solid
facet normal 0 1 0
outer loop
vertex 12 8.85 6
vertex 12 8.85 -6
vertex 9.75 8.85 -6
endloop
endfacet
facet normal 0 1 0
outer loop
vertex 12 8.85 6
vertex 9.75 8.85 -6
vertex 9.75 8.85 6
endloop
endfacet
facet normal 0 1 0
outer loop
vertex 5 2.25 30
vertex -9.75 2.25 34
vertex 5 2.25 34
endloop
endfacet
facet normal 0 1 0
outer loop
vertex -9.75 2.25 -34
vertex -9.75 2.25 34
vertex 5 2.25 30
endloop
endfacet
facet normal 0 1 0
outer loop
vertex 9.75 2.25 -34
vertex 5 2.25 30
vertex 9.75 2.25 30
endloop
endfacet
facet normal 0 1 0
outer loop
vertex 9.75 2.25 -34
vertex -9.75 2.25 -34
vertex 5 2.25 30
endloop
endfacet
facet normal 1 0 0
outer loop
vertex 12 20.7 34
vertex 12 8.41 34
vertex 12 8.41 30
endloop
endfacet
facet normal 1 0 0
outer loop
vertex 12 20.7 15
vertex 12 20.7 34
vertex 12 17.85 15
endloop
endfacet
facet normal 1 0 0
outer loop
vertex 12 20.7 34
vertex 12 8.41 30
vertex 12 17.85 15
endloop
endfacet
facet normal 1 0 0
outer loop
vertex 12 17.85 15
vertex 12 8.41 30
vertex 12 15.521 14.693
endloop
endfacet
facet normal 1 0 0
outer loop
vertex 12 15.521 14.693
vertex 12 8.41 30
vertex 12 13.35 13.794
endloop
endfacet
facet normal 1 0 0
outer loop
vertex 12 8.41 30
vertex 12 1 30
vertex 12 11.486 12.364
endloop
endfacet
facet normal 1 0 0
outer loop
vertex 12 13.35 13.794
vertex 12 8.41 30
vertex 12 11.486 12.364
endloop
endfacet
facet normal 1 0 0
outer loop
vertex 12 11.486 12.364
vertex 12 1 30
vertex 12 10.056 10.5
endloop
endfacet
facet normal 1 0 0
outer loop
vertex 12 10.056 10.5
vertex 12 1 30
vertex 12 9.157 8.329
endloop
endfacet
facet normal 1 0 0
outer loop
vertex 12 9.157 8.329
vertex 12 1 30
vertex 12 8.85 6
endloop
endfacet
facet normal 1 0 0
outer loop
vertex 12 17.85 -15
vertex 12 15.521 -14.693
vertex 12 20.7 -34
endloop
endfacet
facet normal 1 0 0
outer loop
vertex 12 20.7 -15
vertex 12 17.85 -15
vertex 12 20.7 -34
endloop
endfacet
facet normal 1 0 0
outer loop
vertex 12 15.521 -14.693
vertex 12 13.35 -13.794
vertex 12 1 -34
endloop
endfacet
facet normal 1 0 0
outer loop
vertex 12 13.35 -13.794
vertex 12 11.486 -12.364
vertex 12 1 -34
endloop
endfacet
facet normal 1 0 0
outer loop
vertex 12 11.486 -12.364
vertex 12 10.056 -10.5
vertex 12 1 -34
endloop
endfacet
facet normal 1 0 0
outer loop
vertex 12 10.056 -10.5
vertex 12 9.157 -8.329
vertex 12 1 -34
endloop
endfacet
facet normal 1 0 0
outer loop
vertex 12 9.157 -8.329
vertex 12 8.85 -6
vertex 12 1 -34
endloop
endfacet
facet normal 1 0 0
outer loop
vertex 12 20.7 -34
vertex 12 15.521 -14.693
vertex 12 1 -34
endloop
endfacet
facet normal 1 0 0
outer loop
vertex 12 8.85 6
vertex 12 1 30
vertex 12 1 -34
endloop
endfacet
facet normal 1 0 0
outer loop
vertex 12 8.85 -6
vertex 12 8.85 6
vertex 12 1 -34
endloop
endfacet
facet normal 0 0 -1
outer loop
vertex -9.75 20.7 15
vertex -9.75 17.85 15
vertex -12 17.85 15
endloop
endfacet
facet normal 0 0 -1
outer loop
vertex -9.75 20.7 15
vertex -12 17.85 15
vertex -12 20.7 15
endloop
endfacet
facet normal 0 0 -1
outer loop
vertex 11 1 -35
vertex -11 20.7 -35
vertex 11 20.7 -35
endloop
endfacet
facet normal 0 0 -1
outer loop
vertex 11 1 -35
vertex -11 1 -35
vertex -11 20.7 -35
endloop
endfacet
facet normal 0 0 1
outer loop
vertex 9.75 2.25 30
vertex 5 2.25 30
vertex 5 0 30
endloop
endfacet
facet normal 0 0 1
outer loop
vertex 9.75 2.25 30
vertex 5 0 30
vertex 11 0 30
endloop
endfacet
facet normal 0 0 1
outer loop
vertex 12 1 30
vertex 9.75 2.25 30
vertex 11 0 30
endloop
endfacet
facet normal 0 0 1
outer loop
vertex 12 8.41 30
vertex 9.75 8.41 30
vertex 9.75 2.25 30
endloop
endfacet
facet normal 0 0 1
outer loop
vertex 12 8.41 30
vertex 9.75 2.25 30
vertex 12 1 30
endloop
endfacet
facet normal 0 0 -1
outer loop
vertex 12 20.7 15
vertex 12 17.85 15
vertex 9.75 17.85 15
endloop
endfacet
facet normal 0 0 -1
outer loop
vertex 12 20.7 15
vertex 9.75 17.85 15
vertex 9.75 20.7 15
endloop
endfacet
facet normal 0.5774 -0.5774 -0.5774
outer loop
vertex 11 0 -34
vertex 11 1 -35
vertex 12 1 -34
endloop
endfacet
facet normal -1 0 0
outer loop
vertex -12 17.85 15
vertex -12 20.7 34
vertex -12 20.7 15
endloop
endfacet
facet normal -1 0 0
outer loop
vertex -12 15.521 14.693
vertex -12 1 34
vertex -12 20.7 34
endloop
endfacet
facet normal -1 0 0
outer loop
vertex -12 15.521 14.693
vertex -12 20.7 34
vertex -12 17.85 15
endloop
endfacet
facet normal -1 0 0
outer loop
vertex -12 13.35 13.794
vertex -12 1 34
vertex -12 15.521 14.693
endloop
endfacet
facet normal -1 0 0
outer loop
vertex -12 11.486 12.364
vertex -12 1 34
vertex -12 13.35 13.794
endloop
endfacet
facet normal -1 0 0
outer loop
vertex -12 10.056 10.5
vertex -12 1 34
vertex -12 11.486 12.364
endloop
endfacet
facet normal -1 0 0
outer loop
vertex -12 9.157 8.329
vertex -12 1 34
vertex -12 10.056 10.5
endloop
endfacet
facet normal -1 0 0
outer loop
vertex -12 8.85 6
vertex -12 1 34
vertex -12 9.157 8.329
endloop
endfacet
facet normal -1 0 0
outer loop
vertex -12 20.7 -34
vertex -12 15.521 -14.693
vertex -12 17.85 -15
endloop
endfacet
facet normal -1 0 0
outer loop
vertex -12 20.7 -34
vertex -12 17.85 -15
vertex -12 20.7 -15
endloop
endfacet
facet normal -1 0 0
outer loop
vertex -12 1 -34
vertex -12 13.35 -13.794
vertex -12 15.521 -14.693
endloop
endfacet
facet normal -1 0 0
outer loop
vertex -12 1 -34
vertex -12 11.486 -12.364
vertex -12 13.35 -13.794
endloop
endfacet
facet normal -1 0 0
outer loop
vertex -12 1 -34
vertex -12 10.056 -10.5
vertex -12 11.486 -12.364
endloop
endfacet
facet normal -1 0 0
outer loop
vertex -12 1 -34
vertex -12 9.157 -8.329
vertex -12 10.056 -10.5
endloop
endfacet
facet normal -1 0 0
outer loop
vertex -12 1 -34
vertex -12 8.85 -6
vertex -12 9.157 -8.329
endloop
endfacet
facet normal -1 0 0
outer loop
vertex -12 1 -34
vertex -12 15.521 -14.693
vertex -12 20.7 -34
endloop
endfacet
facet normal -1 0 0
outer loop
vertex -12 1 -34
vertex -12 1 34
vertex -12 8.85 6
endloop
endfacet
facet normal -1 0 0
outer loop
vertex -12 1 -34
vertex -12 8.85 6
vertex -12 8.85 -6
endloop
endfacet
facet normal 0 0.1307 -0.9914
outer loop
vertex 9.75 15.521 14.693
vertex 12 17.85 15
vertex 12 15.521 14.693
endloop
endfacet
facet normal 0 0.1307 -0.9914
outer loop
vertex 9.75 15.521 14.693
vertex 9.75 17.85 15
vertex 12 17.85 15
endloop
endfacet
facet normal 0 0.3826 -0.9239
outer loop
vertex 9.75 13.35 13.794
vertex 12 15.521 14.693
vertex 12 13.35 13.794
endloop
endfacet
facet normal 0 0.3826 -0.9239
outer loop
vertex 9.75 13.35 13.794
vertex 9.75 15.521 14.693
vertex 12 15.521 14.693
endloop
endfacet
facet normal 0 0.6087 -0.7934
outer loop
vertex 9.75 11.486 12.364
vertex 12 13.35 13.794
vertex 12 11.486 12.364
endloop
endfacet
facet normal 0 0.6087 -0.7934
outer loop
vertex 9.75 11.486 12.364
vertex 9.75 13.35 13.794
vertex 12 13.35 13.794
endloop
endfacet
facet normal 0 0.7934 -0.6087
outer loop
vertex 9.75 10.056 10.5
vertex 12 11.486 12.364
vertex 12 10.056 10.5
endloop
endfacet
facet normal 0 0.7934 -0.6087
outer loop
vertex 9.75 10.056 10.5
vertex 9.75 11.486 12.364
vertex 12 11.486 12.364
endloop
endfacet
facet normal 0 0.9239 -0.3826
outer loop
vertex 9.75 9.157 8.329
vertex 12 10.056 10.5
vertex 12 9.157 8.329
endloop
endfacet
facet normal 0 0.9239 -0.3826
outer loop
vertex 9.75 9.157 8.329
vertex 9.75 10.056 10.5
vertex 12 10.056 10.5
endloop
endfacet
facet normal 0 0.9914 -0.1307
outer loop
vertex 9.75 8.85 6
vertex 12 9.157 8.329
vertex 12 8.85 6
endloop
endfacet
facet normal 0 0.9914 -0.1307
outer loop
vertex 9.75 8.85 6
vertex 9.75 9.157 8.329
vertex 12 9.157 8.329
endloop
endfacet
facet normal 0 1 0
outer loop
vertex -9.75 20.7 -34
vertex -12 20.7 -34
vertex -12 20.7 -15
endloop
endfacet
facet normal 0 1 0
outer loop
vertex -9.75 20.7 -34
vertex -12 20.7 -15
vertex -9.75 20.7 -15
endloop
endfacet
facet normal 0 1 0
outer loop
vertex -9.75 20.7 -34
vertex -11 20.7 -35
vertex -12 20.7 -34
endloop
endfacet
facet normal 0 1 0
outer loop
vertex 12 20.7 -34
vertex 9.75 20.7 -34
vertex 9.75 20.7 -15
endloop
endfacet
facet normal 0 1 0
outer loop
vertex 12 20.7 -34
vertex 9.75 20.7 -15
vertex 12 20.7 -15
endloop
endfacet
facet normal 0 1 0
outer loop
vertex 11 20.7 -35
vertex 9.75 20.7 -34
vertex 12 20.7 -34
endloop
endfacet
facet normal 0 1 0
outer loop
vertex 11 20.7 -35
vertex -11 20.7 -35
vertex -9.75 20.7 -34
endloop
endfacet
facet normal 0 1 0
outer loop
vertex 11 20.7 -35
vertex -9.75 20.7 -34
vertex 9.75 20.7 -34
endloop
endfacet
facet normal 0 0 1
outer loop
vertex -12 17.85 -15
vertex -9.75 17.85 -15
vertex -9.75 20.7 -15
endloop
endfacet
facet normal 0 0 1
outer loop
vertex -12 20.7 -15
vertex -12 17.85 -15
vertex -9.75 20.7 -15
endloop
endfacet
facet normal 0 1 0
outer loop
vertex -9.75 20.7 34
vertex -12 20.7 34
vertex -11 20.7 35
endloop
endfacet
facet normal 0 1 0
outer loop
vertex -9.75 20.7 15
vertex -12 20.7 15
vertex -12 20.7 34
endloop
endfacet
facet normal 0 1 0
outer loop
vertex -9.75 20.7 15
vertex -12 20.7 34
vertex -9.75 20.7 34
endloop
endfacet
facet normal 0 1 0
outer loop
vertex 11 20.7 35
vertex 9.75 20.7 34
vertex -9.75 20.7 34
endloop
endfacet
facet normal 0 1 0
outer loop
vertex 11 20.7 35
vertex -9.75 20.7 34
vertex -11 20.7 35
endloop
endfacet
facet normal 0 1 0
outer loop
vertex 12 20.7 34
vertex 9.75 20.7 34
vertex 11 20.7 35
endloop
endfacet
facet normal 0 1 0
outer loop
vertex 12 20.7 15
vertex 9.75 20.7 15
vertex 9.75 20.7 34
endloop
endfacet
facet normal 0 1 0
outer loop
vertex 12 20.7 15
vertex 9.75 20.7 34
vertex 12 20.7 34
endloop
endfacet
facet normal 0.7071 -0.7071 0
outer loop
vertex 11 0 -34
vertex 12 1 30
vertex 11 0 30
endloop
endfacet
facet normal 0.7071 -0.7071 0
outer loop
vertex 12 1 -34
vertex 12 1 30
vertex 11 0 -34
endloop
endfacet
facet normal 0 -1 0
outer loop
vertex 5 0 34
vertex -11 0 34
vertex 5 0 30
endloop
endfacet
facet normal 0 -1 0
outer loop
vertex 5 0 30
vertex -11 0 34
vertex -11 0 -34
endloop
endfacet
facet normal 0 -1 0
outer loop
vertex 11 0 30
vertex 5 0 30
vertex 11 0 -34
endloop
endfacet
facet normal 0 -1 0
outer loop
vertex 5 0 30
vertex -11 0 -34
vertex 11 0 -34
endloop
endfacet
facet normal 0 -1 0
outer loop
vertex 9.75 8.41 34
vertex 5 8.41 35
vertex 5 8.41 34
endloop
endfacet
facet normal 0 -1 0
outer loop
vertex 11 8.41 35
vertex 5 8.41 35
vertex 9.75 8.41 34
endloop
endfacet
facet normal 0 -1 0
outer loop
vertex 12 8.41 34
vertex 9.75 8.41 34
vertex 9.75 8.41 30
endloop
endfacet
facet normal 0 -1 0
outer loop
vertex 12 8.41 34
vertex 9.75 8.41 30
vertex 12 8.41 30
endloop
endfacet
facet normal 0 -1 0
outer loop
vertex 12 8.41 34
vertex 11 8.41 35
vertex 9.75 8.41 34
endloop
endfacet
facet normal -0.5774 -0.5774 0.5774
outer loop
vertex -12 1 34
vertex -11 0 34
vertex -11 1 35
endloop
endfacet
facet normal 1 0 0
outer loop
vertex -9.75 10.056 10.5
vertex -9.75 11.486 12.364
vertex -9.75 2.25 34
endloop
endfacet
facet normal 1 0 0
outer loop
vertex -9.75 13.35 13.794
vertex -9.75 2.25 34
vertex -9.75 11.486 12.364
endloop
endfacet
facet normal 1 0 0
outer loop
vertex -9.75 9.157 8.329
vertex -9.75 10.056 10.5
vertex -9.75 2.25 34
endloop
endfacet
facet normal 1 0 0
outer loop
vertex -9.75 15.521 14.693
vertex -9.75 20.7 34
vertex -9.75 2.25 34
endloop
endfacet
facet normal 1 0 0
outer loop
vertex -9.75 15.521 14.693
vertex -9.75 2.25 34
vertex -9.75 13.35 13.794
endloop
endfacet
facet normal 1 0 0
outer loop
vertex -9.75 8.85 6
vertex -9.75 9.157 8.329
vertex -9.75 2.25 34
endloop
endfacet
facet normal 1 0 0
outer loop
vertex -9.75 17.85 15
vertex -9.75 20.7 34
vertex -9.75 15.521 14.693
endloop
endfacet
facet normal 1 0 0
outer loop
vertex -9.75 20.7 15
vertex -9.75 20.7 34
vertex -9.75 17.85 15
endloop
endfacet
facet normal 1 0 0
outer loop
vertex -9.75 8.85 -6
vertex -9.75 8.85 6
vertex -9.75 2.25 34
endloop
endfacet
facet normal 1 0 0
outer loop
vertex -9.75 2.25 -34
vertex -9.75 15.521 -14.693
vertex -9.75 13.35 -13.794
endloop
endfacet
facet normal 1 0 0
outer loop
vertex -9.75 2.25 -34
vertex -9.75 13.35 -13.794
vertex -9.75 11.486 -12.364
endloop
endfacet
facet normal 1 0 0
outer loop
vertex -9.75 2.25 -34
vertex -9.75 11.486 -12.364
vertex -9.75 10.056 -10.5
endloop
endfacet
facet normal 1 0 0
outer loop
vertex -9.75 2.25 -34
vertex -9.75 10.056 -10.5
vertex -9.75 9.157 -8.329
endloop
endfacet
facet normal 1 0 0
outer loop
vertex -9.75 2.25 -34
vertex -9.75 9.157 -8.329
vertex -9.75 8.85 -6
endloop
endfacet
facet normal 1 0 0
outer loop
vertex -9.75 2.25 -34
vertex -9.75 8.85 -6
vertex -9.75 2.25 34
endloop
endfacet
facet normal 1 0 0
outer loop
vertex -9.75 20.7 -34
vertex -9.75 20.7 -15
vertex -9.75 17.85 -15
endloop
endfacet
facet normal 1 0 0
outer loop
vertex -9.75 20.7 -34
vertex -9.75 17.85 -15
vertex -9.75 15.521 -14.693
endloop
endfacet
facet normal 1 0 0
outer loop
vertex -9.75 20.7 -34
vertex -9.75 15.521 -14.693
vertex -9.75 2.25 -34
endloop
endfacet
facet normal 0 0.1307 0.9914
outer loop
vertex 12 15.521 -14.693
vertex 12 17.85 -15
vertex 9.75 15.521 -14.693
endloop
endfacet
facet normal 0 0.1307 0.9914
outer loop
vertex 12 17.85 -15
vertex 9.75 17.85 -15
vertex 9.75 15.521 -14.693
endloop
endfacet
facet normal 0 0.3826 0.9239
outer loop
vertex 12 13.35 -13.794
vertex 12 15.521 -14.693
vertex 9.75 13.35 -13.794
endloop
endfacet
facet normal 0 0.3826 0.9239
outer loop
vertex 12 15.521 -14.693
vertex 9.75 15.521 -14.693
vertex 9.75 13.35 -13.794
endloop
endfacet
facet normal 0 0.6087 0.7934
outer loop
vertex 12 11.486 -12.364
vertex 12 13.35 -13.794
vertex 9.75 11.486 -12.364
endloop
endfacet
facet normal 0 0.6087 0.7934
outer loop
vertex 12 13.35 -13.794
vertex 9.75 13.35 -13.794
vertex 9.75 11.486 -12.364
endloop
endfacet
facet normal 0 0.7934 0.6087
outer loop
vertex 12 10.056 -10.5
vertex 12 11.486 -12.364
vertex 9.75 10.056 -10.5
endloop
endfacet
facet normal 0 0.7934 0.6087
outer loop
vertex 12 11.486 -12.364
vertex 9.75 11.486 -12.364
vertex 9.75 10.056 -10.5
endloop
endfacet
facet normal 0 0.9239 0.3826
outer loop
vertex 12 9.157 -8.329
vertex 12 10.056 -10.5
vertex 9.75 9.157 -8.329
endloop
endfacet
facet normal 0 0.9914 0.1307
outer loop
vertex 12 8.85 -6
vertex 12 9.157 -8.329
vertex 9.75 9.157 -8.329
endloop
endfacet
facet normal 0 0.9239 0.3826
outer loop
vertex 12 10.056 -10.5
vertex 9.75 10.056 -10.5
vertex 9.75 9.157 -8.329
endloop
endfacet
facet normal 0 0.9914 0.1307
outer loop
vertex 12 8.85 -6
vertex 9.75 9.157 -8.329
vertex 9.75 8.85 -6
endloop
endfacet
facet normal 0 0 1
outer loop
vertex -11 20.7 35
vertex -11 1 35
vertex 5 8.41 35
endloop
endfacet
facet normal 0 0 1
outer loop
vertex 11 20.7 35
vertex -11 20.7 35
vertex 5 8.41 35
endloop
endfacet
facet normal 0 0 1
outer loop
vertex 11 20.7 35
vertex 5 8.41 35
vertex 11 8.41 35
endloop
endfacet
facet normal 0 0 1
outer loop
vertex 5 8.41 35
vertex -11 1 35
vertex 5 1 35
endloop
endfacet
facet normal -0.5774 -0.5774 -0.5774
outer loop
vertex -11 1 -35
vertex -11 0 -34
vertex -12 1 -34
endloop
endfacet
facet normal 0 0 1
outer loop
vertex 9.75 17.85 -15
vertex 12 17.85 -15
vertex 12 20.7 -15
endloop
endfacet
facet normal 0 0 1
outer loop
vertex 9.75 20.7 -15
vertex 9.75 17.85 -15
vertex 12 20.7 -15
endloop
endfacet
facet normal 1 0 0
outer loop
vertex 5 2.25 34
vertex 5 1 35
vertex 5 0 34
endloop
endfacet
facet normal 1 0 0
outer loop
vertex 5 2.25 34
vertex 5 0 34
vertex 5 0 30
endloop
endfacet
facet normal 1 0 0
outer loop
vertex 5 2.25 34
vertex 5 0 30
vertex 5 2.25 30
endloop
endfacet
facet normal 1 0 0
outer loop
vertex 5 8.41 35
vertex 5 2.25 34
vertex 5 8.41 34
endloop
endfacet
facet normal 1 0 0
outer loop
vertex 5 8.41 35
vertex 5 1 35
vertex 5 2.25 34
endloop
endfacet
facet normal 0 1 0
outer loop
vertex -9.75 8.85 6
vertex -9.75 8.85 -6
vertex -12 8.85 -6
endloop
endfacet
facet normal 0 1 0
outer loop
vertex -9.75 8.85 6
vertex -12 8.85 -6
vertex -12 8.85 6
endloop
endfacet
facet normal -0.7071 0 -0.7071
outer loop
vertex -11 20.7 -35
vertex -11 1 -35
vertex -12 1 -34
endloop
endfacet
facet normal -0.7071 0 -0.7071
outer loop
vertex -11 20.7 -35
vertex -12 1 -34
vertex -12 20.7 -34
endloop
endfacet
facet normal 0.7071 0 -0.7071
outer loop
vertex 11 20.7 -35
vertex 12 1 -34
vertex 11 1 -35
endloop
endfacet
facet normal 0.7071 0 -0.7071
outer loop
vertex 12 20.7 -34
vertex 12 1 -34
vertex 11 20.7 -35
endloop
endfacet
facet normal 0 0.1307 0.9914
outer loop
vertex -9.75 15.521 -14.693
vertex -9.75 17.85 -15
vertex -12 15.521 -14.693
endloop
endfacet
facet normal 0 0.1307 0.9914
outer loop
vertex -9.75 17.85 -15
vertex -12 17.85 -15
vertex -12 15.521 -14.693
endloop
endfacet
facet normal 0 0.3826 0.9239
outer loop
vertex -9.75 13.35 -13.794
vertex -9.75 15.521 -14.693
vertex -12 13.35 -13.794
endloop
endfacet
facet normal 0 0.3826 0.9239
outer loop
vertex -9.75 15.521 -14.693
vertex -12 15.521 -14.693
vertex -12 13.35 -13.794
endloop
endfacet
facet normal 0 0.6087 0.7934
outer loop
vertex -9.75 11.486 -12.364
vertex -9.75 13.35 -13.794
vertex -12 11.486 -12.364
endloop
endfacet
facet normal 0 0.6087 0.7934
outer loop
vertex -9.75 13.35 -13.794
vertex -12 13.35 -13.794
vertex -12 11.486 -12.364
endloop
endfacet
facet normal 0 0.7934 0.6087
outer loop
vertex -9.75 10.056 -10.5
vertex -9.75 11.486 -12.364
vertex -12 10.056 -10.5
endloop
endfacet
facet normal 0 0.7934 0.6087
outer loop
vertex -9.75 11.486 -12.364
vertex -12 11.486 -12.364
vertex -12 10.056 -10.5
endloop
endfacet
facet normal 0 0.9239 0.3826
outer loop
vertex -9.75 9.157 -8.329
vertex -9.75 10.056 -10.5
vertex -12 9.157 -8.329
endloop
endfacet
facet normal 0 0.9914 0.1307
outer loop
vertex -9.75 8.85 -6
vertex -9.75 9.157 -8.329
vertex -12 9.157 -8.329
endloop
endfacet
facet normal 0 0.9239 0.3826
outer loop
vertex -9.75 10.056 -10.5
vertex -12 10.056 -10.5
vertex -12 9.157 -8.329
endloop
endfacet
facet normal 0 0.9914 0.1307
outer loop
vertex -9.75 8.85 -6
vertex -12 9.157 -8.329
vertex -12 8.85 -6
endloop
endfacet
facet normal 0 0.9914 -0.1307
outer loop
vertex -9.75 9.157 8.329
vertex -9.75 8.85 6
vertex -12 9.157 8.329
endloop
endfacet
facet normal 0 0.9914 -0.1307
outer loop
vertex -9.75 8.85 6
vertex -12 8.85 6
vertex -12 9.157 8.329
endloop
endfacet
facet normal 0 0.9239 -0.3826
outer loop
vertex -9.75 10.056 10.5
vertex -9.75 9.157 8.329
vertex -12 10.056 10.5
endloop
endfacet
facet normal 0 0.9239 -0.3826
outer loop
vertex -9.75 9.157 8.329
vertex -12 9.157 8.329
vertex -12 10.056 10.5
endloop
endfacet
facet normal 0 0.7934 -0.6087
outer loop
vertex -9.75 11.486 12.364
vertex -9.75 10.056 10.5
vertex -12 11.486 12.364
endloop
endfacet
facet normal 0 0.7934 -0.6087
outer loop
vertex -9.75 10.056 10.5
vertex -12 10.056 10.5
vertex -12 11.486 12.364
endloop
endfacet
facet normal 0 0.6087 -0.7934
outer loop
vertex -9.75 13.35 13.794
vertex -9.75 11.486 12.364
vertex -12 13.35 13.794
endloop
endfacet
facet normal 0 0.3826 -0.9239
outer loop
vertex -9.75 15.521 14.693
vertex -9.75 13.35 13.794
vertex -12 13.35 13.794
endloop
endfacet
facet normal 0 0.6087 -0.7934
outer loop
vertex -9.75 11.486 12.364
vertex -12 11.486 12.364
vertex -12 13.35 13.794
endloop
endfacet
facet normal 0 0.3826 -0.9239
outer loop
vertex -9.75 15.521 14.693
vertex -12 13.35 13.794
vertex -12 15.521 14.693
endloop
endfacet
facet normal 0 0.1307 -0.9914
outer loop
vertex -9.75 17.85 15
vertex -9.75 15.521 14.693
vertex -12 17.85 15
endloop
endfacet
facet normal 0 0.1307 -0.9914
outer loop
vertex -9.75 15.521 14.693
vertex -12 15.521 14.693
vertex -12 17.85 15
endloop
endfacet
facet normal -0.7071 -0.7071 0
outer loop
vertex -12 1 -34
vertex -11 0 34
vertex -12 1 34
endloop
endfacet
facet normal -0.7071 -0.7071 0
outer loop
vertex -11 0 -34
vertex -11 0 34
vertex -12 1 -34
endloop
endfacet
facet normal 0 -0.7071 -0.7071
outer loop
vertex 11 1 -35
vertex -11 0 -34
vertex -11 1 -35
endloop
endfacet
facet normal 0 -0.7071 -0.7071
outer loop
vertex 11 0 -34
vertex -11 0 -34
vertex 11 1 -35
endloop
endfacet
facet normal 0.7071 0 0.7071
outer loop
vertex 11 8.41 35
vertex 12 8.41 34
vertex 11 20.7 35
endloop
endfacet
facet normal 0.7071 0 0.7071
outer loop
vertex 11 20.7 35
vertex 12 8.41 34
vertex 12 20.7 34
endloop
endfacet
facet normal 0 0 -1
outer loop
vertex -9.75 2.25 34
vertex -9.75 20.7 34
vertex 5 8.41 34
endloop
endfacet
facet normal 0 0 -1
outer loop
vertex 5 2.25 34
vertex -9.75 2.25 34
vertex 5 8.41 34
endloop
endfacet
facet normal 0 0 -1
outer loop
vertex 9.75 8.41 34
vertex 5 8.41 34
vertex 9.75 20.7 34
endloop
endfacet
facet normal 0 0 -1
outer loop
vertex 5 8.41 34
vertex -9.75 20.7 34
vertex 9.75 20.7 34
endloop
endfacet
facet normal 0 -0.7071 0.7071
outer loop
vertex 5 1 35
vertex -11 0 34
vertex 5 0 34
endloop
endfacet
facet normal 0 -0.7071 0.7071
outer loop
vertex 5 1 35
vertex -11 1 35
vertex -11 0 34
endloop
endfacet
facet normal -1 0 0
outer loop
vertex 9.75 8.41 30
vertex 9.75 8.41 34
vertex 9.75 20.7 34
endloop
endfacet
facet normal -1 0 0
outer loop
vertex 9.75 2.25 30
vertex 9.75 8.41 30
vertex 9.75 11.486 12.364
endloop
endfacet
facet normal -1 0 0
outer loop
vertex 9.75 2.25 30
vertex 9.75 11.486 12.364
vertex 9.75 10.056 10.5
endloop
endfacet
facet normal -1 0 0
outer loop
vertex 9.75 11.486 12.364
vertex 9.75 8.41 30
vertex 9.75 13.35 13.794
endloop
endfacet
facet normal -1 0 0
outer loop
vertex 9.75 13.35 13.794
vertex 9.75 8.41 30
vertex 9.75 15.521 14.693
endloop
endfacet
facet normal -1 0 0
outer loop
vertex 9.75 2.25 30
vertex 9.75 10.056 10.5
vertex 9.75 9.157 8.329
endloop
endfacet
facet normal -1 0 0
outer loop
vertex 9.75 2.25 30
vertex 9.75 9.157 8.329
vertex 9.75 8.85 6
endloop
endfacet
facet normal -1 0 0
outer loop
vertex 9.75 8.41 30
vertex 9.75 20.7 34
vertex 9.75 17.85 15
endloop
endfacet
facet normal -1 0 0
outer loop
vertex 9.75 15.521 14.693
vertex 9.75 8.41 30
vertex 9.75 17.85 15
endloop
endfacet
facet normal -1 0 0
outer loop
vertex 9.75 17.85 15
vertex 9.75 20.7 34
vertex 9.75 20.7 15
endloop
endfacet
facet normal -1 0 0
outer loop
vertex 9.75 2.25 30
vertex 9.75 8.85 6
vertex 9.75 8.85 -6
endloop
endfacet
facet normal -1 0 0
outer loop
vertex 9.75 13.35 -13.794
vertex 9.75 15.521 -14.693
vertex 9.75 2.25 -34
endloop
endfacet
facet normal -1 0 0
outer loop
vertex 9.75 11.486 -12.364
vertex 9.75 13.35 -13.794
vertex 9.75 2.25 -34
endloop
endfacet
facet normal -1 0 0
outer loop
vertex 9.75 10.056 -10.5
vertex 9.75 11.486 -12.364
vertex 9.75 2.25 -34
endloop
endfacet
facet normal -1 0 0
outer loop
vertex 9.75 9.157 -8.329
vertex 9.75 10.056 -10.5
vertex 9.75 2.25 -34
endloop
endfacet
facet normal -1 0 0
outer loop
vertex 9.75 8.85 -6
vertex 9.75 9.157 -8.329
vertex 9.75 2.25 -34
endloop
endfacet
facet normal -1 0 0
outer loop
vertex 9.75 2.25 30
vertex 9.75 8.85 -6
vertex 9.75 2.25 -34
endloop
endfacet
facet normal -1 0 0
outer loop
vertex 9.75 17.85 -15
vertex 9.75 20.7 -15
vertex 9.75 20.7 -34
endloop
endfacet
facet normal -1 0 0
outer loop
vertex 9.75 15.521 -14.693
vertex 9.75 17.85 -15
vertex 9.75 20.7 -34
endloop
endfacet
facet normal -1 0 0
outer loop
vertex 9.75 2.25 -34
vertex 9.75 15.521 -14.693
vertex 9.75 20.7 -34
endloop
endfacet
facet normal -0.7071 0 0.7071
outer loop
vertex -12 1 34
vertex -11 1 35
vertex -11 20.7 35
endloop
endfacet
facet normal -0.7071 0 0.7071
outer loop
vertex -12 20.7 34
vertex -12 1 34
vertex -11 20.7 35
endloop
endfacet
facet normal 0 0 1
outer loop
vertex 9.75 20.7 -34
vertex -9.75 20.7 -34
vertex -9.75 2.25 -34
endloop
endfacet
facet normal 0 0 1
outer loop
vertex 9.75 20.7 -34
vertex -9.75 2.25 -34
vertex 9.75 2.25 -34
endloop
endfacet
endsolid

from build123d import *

# Parameters (mm, degrees)
SKETCH1_W               = 24
SKETCH1_H               = 70
BOSS_EXTRUDE1_DEPTH     = 20.7
SKETCH2_W               = 19.5
SKETCH2_H               = 68
CUT_EXTRUDE1_DEPTH      = 18.45
CUT_EXTRUDE2_DEPTH      = 48.217475578
CUT_EXTRUDE2_DEPTH_BACK = 48.217475578
SKETCH4_W               = 30
SKETCH4_H               = 11.85
FILLET1_R               = 9
SKETCH5_W               = 7
SKETCH5_H               = 8.41
CUT_EXTRUDE3_DEPTH      = 5
CHAMFER1_SIZE           = 1


with BuildPart() as part:
    # Sketch1 → Boss-Extrude1 (new body)
    with BuildSketch(Plane(origin=(0, 0, 0), x_dir=(1, 0, 0), z_dir=(0, 1, 0))):
        Rectangle(SKETCH1_W, SKETCH1_H)
    extrude(amount=BOSS_EXTRUDE1_DEPTH)

    # Sketch2 → Cut-Extrude1 (cut)
    with BuildSketch(Plane(origin=(0, 20.7, 0), x_dir=(1, 0, 0), z_dir=(0, 1, 0))):
        Rectangle(SKETCH2_W, SKETCH2_H)
    extrude(amount=-CUT_EXTRUDE1_DEPTH, mode=Mode.SUBTRACT)

    # Sketch4 → Cut-Extrude2 (cut, two sides: drawn at the far end of the back side and taken through both)
    with BuildSketch(Plane.ZY.offset(12).offset(-CUT_EXTRUDE2_DEPTH_BACK)):
        with Locations((0, 14.775)):
            Rectangle(SKETCH4_W, SKETCH4_H)
    extrude(amount=CUT_EXTRUDE2_DEPTH + CUT_EXTRUDE2_DEPTH_BACK, mode=Mode.SUBTRACT)

    # Fillet1
    fillet1_edges = [part.edges().sort_by_distance(p)[0] for p in [
        (-10.875, 8.85, -15),
        (10.875, 8.85, -15),
        (-10.875, 8.85, 15),
        (10.875, 8.85, 15),
    ]]
    fillet(fillet1_edges, radius=FILLET1_R)

    # Sketch5 → Cut-Extrude3 (cut)
    with BuildSketch(Plane.XY.offset(35)):
        with Locations((8.5, 4.205)):
            Rectangle(SKETCH5_W, SKETCH5_H)
    extrude(amount=-CUT_EXTRUDE3_DEPTH, mode=Mode.SUBTRACT)

    # Chamfer1
    chamfer1_edges = [part.edges().sort_by_distance(p)[0] for p in [
        (0, 0, -35),
        (-3.5, 0, 35),
        (-12, 0, 0),
        (-12, 10.35, -35),
        (12, 10.35, -35),
        (12, 14.555, 35),
        (-12, 10.35, 35),
        (12, 0, -2.5),
    ]]
    chamfer(chamfer1_edges, length=CHAMFER1_SIZE)


solid = part.part
